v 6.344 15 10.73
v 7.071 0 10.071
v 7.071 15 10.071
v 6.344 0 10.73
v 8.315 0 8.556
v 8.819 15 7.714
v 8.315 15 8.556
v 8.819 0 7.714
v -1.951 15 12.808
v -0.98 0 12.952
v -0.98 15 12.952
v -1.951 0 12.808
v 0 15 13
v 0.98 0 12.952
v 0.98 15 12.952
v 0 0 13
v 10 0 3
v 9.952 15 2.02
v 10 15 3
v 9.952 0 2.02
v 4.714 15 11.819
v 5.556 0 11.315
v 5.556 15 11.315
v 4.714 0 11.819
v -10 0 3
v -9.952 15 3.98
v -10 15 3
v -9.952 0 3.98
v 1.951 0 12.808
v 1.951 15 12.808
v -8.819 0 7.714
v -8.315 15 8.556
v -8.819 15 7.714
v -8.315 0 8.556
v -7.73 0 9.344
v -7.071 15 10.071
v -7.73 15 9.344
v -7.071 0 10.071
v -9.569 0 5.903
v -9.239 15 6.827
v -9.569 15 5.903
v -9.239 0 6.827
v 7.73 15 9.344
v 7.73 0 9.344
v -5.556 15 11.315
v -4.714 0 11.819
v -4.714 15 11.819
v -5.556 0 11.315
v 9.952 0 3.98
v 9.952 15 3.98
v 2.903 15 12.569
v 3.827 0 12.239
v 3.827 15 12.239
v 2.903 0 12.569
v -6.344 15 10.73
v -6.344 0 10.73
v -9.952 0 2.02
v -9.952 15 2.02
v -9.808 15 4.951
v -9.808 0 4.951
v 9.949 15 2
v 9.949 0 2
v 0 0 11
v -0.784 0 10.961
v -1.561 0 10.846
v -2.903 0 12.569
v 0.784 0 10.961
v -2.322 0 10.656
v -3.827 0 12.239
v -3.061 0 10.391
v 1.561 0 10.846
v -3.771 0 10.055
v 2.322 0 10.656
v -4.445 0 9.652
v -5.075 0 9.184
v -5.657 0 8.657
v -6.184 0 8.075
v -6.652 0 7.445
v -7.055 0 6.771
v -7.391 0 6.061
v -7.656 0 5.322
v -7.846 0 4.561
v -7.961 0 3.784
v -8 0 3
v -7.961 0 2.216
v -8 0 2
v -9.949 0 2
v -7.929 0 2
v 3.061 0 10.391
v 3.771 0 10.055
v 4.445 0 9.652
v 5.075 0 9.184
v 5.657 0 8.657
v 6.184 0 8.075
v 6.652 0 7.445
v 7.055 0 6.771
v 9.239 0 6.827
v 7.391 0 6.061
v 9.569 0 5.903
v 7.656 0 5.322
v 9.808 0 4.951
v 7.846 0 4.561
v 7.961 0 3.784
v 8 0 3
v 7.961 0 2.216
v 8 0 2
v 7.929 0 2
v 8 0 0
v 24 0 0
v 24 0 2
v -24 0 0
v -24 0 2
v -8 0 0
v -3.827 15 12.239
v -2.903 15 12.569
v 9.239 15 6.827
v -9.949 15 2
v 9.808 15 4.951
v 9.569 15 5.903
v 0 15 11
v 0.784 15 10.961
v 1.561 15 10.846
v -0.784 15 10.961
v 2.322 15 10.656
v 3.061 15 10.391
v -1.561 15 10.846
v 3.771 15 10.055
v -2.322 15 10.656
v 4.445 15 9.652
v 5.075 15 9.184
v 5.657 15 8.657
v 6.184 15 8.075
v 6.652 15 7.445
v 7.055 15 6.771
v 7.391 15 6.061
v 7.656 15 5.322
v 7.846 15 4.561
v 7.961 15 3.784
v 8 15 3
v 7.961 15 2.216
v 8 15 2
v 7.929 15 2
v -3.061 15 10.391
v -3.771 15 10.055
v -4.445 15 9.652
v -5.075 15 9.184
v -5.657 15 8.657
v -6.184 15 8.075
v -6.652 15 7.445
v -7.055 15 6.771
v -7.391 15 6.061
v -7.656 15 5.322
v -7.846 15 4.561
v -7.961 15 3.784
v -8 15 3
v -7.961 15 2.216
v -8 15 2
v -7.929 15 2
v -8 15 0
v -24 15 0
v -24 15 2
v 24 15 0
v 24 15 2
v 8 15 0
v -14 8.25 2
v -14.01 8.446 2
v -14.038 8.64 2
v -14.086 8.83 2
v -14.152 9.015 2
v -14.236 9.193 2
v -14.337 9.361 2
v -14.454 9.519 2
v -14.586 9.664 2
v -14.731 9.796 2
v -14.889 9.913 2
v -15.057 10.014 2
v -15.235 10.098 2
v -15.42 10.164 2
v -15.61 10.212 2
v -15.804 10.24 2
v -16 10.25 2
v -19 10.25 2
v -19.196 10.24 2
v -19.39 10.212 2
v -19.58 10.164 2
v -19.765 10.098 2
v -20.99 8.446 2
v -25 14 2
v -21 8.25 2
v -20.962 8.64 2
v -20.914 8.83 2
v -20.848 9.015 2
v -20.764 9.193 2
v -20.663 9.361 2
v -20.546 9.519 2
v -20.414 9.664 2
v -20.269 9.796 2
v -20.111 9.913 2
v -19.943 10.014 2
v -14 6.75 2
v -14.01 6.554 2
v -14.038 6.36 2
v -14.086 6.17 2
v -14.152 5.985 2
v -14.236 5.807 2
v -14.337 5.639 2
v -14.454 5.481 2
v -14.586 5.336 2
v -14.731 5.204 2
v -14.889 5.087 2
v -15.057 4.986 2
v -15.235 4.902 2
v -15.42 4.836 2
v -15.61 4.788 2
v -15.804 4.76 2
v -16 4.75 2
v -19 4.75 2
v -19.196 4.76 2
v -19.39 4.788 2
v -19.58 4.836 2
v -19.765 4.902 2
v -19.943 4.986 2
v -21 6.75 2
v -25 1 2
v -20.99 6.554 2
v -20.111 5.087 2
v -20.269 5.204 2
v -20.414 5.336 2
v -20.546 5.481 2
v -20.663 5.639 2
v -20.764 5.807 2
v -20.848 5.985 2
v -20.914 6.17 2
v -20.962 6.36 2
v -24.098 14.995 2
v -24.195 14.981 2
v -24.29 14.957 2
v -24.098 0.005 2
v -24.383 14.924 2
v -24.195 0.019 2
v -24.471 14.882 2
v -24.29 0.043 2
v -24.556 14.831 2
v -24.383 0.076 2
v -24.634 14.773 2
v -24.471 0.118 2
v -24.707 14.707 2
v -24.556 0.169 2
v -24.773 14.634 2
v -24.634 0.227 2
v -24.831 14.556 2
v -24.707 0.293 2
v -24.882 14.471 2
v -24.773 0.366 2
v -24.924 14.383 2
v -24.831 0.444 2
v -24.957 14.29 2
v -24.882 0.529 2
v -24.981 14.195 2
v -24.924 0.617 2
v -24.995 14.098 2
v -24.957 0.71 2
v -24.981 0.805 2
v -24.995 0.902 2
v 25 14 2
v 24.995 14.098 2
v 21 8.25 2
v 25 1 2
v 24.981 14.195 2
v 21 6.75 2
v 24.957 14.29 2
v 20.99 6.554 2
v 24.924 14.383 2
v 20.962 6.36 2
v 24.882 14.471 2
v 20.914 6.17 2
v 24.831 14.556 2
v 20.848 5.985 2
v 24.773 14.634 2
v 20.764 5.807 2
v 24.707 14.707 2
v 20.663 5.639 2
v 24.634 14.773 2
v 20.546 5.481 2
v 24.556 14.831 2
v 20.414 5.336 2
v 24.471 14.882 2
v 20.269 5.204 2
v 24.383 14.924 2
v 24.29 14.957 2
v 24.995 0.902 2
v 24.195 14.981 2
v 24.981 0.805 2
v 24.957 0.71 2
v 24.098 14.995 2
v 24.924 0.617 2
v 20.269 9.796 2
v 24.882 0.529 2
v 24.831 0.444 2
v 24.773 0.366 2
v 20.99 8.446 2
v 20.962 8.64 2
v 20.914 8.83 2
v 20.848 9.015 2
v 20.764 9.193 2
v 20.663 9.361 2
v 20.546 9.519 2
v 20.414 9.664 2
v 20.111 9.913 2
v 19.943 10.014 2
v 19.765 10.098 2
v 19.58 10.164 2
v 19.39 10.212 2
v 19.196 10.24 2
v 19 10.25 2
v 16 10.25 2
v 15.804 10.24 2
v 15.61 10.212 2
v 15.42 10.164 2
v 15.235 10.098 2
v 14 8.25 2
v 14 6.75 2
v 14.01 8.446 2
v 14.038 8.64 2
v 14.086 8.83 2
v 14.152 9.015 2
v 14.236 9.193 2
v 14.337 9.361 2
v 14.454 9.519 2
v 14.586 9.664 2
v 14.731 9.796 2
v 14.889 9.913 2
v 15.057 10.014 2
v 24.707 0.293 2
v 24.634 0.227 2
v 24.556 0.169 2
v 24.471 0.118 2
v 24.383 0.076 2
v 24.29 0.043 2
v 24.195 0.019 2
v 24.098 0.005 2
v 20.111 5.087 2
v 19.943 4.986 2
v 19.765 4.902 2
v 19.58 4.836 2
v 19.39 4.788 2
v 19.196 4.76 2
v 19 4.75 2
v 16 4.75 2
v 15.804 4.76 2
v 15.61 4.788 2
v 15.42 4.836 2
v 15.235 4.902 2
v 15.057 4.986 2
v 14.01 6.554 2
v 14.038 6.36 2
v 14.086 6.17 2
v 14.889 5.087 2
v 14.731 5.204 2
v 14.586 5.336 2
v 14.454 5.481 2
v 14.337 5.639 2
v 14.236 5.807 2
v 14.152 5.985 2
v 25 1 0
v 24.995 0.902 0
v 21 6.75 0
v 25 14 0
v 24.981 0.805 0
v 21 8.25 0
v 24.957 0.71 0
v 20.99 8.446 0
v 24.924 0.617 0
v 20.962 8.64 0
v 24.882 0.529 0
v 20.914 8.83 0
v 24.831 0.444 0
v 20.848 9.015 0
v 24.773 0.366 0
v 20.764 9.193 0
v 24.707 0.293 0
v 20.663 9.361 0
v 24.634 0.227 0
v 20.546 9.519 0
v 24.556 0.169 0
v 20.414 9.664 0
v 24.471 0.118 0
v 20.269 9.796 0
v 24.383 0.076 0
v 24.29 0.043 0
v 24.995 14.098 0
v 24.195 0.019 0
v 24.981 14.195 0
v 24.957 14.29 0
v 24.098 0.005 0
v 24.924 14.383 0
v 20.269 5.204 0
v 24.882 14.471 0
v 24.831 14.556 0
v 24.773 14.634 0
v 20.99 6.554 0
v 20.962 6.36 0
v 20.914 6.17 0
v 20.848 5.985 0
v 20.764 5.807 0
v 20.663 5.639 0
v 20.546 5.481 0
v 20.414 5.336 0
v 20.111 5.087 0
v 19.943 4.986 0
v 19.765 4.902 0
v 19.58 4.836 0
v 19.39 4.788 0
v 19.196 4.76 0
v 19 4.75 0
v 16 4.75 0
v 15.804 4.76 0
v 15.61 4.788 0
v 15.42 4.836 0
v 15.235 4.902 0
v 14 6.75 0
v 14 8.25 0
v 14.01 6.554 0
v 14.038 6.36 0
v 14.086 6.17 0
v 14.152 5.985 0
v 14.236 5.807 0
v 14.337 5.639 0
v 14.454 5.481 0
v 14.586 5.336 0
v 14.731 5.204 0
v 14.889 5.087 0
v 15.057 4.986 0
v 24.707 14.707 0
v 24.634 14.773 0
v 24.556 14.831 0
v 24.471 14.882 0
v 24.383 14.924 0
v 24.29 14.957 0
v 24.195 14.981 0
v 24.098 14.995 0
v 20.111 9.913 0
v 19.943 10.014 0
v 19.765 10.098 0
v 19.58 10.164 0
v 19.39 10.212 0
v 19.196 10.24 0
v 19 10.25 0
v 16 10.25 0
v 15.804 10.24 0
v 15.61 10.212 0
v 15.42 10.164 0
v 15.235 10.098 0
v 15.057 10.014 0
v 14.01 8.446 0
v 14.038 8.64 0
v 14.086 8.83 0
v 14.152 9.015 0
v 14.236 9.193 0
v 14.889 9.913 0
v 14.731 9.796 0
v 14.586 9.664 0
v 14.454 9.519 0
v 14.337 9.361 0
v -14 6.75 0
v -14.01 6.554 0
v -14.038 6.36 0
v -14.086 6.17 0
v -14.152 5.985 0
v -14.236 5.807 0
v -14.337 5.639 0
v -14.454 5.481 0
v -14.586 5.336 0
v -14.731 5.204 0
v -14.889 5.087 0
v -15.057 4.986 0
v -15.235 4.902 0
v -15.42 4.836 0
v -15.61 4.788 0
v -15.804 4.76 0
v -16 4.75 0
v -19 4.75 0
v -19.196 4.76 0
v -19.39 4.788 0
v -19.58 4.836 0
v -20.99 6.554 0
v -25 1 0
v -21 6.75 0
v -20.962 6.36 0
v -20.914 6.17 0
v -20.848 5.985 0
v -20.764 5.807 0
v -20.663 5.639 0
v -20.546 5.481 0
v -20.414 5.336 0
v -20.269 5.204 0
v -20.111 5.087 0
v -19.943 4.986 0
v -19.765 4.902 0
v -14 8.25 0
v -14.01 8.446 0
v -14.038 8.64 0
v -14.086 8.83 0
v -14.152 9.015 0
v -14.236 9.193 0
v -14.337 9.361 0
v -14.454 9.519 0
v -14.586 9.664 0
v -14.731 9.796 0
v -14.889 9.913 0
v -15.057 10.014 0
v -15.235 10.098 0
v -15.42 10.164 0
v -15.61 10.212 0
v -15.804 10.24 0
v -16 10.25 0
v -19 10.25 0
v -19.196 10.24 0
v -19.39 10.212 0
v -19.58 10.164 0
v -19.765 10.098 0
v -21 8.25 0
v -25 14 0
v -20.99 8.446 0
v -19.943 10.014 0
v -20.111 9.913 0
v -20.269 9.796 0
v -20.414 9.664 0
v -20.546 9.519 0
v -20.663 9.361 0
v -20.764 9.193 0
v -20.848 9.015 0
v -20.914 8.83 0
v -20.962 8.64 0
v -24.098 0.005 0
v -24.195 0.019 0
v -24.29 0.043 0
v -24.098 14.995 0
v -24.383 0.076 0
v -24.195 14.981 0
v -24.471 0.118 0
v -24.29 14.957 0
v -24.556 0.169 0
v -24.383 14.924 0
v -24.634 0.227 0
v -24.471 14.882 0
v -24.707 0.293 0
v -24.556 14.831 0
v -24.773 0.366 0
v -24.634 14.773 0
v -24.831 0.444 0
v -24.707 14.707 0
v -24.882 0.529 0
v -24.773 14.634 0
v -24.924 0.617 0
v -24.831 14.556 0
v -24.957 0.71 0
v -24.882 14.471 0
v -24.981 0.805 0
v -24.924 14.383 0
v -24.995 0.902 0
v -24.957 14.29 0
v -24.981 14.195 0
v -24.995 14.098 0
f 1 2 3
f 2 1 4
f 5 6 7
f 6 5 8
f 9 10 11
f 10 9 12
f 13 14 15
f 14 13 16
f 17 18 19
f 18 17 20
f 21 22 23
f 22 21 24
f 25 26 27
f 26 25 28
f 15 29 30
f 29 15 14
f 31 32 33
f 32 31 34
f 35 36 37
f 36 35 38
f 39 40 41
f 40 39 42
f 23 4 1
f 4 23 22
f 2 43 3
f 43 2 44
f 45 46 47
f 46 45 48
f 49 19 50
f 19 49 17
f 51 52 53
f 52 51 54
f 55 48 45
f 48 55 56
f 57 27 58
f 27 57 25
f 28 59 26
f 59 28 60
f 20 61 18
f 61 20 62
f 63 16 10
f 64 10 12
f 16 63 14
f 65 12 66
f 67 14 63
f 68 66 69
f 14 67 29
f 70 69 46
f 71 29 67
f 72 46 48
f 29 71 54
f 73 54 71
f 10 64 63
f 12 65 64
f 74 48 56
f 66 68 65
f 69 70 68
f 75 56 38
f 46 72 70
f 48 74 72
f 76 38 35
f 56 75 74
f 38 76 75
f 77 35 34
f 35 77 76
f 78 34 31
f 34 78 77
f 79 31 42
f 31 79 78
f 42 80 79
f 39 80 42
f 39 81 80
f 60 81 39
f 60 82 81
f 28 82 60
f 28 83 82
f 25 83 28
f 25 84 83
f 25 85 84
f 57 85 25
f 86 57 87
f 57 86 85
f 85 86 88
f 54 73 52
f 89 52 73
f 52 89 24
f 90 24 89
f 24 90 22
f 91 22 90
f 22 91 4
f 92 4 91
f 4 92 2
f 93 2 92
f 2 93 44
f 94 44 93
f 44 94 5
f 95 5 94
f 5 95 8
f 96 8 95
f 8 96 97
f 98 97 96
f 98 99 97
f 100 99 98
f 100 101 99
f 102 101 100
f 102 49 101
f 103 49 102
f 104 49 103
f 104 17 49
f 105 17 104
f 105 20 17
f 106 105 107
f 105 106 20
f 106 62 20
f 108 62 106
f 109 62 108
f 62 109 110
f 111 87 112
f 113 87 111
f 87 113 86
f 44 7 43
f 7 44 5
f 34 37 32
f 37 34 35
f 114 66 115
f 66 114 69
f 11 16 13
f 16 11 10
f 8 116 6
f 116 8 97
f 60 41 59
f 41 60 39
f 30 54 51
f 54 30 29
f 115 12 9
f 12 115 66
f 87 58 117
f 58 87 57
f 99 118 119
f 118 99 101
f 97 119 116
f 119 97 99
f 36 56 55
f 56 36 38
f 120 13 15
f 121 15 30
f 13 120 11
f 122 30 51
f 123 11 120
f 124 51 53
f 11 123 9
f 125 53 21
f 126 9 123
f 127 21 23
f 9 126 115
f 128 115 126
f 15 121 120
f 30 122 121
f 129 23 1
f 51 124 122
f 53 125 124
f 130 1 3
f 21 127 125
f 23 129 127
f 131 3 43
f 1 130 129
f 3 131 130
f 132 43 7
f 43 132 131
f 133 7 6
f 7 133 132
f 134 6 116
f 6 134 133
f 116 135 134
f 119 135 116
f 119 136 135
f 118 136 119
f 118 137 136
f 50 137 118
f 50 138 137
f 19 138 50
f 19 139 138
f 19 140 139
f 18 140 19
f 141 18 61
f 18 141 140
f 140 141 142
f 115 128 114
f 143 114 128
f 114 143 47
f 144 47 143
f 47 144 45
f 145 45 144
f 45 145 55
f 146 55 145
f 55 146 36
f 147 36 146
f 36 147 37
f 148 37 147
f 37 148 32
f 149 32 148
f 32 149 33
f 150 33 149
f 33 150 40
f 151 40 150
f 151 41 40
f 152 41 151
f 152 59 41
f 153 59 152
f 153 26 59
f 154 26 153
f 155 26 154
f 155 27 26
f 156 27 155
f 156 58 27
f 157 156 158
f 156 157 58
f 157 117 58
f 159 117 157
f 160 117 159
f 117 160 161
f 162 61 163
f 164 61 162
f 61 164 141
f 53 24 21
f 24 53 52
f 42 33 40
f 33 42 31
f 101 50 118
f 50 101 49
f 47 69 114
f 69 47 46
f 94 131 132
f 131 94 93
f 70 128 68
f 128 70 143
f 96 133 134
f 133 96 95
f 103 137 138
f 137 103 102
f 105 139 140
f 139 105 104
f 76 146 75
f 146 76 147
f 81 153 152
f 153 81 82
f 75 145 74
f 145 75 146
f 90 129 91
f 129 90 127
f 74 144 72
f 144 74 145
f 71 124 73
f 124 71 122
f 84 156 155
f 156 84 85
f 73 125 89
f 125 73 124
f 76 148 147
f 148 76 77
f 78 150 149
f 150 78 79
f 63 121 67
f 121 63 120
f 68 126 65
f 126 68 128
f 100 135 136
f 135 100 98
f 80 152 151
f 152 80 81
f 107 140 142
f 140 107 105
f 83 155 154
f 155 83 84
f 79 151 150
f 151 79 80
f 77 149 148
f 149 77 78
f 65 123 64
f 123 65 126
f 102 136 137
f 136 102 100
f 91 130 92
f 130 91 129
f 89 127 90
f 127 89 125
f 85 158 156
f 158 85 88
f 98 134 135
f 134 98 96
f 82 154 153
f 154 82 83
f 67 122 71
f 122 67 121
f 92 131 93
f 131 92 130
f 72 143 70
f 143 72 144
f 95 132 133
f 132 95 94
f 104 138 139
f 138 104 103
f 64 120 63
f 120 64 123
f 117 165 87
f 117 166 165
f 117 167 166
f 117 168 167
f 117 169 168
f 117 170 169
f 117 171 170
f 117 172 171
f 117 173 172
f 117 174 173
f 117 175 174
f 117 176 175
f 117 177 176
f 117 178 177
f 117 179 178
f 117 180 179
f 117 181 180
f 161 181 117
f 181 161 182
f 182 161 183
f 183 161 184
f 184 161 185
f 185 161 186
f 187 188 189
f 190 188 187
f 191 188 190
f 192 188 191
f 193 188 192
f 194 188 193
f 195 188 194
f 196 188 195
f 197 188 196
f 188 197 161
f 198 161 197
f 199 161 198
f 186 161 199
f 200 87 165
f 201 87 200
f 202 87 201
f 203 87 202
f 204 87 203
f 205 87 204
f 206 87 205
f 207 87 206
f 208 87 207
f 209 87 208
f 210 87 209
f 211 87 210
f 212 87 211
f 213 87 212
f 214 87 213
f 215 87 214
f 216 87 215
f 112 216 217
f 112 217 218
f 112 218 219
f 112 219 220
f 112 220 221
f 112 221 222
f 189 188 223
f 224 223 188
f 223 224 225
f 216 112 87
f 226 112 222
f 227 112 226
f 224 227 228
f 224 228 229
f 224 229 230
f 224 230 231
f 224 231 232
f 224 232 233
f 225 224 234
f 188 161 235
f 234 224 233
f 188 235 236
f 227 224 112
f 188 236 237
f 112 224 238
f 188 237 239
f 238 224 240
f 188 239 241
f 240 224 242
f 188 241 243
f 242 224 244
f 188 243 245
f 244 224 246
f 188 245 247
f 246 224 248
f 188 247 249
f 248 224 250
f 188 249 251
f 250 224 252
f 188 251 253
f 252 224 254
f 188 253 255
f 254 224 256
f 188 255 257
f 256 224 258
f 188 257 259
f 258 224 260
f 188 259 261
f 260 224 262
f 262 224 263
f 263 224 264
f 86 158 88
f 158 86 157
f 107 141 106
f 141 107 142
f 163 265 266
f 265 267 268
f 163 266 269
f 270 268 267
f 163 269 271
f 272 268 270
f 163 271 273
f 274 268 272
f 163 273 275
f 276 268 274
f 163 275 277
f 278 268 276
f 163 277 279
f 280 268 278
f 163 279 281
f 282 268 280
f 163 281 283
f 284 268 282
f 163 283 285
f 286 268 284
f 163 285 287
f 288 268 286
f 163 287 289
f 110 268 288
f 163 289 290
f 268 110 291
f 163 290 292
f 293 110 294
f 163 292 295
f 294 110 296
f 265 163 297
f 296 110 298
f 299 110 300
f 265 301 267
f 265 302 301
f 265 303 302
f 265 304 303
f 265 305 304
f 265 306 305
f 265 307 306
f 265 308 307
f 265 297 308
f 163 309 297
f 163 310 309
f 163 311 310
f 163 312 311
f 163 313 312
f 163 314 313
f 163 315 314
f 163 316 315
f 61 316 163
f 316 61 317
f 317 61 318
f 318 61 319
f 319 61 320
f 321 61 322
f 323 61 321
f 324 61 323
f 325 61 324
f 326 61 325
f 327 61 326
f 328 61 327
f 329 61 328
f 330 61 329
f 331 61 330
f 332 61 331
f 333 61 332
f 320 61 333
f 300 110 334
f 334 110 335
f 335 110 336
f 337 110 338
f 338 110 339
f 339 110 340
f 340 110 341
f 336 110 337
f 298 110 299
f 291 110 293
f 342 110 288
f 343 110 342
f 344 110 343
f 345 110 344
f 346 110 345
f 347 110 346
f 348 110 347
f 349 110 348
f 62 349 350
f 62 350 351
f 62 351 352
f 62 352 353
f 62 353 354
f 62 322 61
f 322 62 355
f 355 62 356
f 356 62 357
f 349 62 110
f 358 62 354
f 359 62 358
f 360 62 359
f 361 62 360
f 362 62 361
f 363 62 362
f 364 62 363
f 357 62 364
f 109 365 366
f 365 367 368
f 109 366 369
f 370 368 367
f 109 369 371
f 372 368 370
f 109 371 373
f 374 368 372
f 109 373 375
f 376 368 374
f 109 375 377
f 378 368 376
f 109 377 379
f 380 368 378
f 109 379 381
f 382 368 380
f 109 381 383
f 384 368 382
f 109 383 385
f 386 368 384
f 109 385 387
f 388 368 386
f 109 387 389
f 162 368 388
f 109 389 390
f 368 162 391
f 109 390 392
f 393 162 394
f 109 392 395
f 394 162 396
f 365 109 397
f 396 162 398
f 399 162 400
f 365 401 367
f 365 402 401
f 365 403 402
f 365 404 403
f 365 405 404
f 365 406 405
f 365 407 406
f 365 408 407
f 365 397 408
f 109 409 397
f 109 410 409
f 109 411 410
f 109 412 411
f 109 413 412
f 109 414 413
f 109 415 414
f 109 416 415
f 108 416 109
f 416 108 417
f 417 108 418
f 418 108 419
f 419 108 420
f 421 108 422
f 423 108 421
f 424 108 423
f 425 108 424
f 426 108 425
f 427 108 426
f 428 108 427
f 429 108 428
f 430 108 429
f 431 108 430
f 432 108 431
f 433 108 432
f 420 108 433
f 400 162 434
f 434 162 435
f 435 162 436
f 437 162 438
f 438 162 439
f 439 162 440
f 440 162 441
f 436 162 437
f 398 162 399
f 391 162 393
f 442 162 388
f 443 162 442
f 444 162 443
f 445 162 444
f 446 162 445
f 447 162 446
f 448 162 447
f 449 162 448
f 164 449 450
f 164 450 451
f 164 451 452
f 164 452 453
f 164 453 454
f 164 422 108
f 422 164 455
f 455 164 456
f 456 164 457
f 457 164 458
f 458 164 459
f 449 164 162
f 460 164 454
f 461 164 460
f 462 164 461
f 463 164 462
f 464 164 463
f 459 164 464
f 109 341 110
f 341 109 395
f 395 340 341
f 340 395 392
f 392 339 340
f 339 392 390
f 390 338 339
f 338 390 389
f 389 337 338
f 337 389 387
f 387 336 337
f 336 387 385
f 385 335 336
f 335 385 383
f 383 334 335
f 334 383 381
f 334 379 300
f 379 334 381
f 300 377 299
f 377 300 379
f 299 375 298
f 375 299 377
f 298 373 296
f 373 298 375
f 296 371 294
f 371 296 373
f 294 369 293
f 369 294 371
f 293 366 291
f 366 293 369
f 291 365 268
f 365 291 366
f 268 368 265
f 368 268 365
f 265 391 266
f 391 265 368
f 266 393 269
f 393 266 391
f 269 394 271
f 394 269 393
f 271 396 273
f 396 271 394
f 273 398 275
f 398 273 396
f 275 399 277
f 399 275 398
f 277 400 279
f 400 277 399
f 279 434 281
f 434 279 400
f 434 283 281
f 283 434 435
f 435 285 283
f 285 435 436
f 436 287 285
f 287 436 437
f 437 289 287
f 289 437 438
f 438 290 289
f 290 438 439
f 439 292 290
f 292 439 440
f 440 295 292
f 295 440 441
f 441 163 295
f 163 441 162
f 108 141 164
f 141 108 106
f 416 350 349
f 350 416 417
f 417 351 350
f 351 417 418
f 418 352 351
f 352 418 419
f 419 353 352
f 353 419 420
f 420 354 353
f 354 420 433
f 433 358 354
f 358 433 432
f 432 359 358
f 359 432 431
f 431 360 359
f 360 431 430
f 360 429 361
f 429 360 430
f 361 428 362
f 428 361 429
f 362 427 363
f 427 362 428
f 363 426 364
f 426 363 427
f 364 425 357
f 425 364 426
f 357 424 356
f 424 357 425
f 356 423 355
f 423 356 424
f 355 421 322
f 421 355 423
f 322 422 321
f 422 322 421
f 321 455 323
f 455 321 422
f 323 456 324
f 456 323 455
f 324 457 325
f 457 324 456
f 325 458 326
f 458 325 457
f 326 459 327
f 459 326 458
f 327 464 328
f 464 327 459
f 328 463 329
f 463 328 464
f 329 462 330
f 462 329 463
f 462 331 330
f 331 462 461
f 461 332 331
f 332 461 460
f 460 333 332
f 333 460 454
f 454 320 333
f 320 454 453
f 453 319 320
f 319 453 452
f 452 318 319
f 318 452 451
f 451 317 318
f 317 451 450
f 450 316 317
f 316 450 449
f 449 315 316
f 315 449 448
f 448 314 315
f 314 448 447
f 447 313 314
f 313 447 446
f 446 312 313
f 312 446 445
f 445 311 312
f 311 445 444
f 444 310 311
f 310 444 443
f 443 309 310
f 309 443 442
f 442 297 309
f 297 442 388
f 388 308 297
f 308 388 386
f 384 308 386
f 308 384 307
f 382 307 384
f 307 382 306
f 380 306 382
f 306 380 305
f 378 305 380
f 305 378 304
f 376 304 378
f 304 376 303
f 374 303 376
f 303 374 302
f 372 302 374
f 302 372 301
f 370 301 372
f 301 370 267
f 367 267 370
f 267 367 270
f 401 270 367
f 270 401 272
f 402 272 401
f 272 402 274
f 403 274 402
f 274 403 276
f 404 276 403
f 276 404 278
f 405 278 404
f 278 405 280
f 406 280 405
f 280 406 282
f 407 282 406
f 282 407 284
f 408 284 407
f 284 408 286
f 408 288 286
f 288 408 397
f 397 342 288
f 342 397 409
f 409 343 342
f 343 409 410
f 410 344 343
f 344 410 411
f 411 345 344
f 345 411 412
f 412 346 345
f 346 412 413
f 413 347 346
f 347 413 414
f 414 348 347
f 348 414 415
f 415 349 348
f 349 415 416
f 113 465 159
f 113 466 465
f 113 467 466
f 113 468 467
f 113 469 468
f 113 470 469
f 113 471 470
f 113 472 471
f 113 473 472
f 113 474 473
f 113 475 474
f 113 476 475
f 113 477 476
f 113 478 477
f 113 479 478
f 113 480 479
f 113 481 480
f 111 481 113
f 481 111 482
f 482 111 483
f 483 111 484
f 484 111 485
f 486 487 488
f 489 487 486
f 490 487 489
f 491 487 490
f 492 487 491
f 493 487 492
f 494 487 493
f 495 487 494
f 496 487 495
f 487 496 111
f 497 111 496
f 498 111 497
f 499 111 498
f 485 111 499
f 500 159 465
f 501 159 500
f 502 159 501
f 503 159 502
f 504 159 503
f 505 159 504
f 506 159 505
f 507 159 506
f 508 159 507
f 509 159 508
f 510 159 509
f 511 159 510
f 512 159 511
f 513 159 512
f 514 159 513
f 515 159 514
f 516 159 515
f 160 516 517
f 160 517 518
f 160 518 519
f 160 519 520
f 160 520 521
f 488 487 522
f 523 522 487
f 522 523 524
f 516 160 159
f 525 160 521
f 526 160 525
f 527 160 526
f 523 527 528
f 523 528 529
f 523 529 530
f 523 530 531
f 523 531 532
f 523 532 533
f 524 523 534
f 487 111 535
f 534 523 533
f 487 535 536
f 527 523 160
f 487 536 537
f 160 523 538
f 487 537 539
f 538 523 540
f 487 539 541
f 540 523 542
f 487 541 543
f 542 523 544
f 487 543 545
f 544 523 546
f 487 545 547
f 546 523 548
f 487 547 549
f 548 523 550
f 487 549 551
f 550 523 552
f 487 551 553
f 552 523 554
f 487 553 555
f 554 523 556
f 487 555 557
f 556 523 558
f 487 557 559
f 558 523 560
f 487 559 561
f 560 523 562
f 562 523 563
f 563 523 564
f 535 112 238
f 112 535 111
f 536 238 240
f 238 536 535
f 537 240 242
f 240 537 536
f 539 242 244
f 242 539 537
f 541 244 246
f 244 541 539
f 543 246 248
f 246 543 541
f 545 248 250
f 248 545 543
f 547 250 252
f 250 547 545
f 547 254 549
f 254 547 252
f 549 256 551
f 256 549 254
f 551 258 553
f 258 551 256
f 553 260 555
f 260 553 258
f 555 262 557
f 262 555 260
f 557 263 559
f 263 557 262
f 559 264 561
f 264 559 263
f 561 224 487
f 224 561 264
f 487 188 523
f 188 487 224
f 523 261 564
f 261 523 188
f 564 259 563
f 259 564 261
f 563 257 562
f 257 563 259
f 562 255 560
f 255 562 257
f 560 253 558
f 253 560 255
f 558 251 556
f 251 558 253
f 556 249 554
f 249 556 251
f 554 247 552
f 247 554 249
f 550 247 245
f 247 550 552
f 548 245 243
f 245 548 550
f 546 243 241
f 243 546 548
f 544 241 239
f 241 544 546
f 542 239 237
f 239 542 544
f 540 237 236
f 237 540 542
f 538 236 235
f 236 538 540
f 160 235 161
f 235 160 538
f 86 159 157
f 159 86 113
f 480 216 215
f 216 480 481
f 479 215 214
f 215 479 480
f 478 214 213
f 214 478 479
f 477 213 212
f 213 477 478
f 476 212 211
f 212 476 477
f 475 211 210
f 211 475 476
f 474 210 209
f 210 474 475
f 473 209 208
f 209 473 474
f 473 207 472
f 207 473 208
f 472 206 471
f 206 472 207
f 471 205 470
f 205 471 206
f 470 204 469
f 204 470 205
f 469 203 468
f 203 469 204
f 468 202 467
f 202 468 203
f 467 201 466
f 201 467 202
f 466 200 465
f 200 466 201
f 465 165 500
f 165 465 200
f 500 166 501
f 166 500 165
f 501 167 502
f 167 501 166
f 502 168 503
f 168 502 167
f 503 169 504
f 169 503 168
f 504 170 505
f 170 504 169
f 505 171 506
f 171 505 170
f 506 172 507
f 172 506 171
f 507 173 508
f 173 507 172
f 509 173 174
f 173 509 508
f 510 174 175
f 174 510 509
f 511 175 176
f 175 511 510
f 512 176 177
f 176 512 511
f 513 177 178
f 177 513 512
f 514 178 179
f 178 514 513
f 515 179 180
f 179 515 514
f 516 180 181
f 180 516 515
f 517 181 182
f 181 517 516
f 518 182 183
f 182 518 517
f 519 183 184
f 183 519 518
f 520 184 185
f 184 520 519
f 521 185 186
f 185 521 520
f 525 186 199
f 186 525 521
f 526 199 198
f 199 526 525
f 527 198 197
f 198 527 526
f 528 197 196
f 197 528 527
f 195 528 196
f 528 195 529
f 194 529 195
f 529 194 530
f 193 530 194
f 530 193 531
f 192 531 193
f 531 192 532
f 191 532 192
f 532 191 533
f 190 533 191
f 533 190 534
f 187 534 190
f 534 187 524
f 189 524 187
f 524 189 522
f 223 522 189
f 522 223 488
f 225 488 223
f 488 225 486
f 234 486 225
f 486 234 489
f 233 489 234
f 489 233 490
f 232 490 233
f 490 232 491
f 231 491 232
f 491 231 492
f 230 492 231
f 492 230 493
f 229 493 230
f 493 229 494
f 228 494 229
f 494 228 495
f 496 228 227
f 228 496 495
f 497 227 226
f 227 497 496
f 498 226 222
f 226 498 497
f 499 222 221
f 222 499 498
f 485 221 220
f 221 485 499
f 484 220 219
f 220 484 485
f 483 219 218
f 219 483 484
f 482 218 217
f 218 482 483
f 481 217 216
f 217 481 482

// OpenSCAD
$fn = 64;

w = 15;
x0 = 17;
t = 2.0;
d = 20;

module fillet(smooth) {
   offset(r = smooth) {
     offset(delta = -smooth) {
       children();
     }
   }
}


module wing() {
    linear_extrude(height=t)
    translate([d/2 - t, 0])
    union() {
        fillet(1)
        difference() {
            square([x0, w]);
            translate([x0 / 2 + 1, w / 2])
            fillet(2) square([7, 5.5], center=true);
        }
        square([t, w]);
    }
}

translate([0, 0, t])
intersection() {
    translate([0, 0, 1])
    rotate([0, 90, 90])
    difference() {
        cylinder(h=w, d=d);
        cylinder(h=w, d=d - 2 * t);
    }
    translate([-50, 0, 0])
    cube([100, 100, 100]);
}

wing();
mirror([1, 0, 0])
wing();
